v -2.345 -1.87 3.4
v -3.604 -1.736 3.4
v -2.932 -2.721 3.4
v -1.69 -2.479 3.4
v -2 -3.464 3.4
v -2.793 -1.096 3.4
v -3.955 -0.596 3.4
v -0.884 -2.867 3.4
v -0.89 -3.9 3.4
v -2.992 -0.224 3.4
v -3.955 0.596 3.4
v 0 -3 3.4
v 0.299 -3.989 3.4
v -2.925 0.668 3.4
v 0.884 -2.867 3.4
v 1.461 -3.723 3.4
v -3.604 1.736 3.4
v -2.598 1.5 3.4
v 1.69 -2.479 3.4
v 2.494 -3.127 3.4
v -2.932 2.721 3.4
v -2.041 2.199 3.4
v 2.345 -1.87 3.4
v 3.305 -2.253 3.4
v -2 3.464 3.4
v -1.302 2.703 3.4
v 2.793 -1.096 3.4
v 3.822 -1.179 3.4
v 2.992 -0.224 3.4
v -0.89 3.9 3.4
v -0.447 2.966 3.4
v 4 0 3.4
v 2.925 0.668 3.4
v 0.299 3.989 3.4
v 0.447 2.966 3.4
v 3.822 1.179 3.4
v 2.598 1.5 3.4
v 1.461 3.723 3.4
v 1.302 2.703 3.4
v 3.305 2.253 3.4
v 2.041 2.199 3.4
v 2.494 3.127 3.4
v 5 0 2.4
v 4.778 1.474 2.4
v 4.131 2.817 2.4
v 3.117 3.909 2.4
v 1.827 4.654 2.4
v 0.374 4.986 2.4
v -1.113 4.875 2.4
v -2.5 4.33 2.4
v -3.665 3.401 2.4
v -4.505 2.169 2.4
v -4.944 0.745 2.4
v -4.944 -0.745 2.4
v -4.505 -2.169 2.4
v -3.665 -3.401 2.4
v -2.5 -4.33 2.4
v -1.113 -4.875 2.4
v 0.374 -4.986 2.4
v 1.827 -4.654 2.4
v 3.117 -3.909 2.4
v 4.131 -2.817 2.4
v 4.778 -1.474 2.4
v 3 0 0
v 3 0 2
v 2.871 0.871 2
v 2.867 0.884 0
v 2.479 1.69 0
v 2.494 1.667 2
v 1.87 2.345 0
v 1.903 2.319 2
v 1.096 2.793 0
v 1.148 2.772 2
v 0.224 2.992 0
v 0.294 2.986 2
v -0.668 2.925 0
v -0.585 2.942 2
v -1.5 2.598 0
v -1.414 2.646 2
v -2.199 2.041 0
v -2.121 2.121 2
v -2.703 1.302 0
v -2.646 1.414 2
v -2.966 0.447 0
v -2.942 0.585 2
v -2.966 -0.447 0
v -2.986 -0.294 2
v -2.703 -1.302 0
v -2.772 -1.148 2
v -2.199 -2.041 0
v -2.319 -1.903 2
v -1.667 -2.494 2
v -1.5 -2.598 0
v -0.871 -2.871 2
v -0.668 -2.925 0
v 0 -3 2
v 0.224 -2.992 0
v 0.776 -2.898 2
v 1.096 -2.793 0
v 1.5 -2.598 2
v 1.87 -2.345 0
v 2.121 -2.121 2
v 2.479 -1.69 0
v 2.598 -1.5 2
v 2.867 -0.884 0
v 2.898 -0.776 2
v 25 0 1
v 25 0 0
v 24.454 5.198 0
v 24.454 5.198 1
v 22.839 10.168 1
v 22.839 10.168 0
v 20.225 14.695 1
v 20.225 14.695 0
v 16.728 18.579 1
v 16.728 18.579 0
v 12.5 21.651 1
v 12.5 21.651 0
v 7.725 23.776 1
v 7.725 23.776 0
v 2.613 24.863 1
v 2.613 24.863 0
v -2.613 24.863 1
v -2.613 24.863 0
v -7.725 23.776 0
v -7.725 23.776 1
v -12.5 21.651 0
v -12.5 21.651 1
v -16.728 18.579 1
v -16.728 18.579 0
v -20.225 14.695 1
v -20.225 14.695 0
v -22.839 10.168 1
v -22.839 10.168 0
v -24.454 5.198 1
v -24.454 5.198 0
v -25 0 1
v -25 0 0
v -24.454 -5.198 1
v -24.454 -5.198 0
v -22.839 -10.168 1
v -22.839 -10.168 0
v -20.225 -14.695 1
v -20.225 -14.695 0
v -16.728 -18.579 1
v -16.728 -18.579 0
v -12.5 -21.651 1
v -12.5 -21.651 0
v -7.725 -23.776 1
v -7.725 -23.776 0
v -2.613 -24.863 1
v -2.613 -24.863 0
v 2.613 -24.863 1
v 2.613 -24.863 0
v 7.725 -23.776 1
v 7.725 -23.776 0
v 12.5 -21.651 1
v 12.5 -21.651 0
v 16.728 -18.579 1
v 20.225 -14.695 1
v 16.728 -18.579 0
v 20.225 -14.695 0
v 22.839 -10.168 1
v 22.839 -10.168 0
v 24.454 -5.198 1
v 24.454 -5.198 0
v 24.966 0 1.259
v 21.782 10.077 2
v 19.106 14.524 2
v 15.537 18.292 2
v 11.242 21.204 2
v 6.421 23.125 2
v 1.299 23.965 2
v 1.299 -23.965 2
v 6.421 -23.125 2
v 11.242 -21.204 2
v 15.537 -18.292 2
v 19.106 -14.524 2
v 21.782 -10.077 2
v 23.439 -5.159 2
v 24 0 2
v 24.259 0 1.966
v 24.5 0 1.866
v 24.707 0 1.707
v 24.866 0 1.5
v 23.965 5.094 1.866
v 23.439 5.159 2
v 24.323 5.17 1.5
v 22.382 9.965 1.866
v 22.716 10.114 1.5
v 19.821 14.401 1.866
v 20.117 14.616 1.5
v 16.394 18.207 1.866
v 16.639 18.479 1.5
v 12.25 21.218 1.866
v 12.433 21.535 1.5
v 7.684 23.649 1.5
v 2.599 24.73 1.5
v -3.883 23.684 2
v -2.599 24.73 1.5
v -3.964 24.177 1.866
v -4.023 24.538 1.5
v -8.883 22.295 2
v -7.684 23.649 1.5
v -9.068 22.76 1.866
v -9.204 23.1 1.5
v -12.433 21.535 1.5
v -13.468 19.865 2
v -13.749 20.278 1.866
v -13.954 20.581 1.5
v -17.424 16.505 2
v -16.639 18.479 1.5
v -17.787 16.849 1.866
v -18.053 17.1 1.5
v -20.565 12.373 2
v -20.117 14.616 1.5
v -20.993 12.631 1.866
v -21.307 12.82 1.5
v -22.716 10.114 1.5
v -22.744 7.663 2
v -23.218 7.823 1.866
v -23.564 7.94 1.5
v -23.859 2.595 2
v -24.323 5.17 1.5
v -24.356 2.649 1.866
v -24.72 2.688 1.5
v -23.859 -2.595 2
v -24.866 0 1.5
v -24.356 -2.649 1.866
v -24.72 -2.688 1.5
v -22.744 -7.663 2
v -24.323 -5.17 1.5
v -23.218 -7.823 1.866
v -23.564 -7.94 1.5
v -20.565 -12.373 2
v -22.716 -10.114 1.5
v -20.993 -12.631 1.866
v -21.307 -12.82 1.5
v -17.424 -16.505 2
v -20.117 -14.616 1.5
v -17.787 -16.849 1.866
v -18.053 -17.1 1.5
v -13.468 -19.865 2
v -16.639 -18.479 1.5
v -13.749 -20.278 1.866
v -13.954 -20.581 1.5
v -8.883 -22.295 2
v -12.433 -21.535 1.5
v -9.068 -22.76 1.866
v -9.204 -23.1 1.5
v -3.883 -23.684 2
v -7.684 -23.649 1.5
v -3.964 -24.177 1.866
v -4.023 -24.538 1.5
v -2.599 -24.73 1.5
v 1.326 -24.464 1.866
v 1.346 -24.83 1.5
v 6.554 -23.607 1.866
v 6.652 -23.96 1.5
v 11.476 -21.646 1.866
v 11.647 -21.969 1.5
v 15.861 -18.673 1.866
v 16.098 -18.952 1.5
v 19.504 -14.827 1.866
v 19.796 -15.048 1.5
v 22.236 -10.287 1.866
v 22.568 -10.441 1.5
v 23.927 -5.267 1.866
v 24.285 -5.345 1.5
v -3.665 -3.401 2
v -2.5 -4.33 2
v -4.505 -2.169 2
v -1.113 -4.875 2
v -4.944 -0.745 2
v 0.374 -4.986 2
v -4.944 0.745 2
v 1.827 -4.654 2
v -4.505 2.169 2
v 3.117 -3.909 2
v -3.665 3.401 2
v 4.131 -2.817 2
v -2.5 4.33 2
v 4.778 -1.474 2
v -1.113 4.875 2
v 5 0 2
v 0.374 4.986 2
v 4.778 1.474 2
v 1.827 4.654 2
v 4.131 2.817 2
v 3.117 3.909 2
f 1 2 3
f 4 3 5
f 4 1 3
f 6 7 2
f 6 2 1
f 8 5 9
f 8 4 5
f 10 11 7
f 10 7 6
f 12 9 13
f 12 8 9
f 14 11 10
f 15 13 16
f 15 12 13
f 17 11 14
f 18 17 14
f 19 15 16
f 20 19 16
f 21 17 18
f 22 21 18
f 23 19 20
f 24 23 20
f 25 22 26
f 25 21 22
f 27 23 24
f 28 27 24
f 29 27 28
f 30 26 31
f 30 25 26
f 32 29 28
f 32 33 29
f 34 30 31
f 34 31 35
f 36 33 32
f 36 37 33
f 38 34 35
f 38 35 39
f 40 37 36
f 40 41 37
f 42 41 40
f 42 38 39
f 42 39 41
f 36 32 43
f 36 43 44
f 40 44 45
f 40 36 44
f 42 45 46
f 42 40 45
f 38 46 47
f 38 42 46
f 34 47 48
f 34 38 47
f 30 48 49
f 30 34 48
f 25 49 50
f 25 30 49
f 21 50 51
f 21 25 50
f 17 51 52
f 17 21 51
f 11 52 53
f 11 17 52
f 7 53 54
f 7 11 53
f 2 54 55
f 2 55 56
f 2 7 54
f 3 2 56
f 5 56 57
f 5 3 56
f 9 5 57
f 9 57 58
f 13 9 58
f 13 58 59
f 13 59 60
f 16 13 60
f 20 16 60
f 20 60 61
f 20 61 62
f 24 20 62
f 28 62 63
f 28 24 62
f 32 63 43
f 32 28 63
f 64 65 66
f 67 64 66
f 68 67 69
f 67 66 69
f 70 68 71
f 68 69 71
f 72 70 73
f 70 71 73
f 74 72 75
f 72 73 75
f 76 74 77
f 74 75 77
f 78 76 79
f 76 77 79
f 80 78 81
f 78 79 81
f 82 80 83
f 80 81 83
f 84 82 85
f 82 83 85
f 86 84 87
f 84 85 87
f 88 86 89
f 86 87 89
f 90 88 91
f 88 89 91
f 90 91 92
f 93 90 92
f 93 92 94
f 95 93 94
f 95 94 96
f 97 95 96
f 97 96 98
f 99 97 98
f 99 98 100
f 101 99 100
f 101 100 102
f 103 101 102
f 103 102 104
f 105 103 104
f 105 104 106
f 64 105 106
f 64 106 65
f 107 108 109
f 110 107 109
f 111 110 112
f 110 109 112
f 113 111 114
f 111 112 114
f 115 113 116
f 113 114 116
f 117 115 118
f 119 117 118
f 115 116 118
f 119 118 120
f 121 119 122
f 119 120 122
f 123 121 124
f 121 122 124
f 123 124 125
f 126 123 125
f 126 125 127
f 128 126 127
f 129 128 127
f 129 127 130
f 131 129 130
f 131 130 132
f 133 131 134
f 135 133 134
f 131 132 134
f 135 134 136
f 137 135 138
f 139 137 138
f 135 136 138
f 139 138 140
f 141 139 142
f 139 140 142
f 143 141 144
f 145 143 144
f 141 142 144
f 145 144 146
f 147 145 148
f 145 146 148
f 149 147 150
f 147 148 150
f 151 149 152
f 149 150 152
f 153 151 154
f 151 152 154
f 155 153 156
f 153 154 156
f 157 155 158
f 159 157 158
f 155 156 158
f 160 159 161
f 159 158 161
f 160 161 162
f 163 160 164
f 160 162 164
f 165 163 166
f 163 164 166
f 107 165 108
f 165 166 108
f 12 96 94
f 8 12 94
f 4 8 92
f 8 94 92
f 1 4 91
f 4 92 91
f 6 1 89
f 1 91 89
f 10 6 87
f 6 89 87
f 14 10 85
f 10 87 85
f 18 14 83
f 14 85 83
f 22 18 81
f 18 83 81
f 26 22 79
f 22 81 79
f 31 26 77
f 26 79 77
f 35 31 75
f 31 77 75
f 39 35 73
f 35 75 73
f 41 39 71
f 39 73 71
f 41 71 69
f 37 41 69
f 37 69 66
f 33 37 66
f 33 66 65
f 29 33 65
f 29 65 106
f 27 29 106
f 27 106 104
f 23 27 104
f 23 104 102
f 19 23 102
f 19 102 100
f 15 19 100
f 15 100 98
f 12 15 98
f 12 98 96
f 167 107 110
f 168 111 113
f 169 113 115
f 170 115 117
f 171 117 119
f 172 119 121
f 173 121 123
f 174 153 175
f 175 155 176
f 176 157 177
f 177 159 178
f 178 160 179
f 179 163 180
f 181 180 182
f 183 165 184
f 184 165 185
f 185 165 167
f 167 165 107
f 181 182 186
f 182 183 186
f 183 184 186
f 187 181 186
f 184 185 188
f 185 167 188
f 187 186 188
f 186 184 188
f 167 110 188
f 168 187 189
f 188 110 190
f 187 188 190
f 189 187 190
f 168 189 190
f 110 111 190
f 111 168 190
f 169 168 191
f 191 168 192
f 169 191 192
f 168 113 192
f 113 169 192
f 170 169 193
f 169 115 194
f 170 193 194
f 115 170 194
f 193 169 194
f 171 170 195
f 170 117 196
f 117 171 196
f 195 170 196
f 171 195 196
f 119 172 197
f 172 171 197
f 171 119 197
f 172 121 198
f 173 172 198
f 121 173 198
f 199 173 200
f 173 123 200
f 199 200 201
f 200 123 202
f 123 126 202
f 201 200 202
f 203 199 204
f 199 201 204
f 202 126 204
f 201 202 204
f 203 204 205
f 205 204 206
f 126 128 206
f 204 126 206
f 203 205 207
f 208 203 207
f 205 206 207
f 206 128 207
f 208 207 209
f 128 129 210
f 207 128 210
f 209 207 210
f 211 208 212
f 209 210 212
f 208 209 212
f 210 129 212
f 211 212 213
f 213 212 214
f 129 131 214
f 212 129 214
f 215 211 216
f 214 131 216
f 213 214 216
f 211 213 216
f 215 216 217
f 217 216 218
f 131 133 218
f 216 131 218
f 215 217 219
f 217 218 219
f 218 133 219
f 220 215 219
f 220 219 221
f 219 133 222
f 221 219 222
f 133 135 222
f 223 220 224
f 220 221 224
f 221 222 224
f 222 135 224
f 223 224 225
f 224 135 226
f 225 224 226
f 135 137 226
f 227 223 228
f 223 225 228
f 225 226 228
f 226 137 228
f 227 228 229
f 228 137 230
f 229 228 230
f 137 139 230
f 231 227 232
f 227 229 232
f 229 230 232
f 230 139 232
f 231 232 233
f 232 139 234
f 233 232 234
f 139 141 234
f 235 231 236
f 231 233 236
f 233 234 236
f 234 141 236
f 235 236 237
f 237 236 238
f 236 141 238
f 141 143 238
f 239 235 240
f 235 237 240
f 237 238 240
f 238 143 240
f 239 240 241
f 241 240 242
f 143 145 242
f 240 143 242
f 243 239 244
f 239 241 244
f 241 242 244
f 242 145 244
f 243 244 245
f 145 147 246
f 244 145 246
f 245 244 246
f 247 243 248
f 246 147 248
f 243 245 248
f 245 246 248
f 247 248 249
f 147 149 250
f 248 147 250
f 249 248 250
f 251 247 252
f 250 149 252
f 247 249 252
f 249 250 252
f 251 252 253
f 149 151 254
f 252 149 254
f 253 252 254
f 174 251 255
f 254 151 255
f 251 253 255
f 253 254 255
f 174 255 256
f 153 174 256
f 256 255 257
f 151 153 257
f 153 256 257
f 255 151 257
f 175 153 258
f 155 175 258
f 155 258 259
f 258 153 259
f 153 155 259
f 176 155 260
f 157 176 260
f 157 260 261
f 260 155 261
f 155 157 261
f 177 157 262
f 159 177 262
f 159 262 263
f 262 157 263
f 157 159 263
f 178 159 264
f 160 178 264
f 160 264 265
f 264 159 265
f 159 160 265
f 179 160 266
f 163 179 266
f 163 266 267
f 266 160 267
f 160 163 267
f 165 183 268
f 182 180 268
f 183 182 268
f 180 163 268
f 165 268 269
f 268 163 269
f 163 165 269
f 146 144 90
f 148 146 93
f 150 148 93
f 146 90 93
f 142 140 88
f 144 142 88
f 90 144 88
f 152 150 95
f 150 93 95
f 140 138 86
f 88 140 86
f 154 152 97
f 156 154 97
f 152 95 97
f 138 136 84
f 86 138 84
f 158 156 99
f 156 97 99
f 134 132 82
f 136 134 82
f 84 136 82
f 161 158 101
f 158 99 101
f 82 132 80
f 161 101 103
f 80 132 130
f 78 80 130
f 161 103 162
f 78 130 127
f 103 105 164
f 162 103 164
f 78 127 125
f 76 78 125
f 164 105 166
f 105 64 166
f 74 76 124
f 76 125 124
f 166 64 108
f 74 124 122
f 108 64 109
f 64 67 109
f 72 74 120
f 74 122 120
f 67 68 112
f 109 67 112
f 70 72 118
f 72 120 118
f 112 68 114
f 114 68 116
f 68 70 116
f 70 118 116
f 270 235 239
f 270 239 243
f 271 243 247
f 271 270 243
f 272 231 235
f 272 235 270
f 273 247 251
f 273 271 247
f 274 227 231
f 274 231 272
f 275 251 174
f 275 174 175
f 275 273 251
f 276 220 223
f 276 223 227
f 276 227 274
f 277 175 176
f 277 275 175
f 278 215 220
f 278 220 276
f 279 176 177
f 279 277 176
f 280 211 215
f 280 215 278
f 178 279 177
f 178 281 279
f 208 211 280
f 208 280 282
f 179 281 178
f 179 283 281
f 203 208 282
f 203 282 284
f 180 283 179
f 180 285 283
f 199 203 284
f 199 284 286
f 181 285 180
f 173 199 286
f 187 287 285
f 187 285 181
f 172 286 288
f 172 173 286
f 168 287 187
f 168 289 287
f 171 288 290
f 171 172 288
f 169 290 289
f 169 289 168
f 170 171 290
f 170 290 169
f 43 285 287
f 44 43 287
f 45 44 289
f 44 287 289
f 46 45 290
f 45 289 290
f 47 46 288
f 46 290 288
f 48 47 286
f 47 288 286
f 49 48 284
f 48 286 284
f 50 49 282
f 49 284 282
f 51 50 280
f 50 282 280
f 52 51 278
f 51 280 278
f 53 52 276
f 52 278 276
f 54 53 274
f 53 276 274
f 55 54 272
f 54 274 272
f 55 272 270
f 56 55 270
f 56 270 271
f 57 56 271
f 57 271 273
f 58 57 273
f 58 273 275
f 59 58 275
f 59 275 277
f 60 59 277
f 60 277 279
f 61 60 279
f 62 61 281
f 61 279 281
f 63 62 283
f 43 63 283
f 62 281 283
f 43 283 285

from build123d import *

# Parameters (mm, degrees)
SKETCH_R        = 25
PAD_DEPTH       = 2
SKETCH001_R     = 3
POCKET_DEPTH    = 5
SKETCH002_R     = 5
PAD001_DEPTH    = 1.4
PAD001_FACE6_R  = 3
POCKET001_DEPTH = 5
FILLET_R        = 1
CHAMFER_SIZE    = 1


with BuildPart() as part:
    # Sketch → Pad (new body)
    with BuildSketch(Plane.XY):
        Circle(SKETCH_R)
    extrude(amount=PAD_DEPTH)

    # Sketch001 (on Face3 of Pad) → Pocket (cut)
    with BuildSketch(Plane.XY.offset(2)):
        Circle(SKETCH001_R)
    extrude(amount=-POCKET_DEPTH, mode=Mode.SUBTRACT)

    # Sketch002 (on Face3 of Pocket) → Pad001 (join)
    with BuildSketch(Plane.XY.offset(2)):
        Circle(SKETCH002_R)
    extrude(amount=PAD001_DEPTH)

    # Pad001 Face6 → Pocket001 (cut)
    with BuildSketch(Plane(origin=(0, 0, 2), x_dir=(0, -1, 0), z_dir=(0, 0, -1))):
        Circle(PAD001_FACE6_R)
    extrude(amount=-POCKET001_DEPTH, mode=Mode.SUBTRACT)

    # Fillet
    fillet_edges = [part.edges().sort_by_distance(p)[0] for p in [
        (-25, 0, 2),
    ]]
    fillet(fillet_edges, radius=FILLET_R)

    # Chamfer
    chamfer_edges = [part.edges().sort_by_distance(p)[0] for p in [
        (-5, 0, 3.4),
    ]]
    chamfer(chamfer_edges, length=CHAMFER_SIZE)


solid = part.part
